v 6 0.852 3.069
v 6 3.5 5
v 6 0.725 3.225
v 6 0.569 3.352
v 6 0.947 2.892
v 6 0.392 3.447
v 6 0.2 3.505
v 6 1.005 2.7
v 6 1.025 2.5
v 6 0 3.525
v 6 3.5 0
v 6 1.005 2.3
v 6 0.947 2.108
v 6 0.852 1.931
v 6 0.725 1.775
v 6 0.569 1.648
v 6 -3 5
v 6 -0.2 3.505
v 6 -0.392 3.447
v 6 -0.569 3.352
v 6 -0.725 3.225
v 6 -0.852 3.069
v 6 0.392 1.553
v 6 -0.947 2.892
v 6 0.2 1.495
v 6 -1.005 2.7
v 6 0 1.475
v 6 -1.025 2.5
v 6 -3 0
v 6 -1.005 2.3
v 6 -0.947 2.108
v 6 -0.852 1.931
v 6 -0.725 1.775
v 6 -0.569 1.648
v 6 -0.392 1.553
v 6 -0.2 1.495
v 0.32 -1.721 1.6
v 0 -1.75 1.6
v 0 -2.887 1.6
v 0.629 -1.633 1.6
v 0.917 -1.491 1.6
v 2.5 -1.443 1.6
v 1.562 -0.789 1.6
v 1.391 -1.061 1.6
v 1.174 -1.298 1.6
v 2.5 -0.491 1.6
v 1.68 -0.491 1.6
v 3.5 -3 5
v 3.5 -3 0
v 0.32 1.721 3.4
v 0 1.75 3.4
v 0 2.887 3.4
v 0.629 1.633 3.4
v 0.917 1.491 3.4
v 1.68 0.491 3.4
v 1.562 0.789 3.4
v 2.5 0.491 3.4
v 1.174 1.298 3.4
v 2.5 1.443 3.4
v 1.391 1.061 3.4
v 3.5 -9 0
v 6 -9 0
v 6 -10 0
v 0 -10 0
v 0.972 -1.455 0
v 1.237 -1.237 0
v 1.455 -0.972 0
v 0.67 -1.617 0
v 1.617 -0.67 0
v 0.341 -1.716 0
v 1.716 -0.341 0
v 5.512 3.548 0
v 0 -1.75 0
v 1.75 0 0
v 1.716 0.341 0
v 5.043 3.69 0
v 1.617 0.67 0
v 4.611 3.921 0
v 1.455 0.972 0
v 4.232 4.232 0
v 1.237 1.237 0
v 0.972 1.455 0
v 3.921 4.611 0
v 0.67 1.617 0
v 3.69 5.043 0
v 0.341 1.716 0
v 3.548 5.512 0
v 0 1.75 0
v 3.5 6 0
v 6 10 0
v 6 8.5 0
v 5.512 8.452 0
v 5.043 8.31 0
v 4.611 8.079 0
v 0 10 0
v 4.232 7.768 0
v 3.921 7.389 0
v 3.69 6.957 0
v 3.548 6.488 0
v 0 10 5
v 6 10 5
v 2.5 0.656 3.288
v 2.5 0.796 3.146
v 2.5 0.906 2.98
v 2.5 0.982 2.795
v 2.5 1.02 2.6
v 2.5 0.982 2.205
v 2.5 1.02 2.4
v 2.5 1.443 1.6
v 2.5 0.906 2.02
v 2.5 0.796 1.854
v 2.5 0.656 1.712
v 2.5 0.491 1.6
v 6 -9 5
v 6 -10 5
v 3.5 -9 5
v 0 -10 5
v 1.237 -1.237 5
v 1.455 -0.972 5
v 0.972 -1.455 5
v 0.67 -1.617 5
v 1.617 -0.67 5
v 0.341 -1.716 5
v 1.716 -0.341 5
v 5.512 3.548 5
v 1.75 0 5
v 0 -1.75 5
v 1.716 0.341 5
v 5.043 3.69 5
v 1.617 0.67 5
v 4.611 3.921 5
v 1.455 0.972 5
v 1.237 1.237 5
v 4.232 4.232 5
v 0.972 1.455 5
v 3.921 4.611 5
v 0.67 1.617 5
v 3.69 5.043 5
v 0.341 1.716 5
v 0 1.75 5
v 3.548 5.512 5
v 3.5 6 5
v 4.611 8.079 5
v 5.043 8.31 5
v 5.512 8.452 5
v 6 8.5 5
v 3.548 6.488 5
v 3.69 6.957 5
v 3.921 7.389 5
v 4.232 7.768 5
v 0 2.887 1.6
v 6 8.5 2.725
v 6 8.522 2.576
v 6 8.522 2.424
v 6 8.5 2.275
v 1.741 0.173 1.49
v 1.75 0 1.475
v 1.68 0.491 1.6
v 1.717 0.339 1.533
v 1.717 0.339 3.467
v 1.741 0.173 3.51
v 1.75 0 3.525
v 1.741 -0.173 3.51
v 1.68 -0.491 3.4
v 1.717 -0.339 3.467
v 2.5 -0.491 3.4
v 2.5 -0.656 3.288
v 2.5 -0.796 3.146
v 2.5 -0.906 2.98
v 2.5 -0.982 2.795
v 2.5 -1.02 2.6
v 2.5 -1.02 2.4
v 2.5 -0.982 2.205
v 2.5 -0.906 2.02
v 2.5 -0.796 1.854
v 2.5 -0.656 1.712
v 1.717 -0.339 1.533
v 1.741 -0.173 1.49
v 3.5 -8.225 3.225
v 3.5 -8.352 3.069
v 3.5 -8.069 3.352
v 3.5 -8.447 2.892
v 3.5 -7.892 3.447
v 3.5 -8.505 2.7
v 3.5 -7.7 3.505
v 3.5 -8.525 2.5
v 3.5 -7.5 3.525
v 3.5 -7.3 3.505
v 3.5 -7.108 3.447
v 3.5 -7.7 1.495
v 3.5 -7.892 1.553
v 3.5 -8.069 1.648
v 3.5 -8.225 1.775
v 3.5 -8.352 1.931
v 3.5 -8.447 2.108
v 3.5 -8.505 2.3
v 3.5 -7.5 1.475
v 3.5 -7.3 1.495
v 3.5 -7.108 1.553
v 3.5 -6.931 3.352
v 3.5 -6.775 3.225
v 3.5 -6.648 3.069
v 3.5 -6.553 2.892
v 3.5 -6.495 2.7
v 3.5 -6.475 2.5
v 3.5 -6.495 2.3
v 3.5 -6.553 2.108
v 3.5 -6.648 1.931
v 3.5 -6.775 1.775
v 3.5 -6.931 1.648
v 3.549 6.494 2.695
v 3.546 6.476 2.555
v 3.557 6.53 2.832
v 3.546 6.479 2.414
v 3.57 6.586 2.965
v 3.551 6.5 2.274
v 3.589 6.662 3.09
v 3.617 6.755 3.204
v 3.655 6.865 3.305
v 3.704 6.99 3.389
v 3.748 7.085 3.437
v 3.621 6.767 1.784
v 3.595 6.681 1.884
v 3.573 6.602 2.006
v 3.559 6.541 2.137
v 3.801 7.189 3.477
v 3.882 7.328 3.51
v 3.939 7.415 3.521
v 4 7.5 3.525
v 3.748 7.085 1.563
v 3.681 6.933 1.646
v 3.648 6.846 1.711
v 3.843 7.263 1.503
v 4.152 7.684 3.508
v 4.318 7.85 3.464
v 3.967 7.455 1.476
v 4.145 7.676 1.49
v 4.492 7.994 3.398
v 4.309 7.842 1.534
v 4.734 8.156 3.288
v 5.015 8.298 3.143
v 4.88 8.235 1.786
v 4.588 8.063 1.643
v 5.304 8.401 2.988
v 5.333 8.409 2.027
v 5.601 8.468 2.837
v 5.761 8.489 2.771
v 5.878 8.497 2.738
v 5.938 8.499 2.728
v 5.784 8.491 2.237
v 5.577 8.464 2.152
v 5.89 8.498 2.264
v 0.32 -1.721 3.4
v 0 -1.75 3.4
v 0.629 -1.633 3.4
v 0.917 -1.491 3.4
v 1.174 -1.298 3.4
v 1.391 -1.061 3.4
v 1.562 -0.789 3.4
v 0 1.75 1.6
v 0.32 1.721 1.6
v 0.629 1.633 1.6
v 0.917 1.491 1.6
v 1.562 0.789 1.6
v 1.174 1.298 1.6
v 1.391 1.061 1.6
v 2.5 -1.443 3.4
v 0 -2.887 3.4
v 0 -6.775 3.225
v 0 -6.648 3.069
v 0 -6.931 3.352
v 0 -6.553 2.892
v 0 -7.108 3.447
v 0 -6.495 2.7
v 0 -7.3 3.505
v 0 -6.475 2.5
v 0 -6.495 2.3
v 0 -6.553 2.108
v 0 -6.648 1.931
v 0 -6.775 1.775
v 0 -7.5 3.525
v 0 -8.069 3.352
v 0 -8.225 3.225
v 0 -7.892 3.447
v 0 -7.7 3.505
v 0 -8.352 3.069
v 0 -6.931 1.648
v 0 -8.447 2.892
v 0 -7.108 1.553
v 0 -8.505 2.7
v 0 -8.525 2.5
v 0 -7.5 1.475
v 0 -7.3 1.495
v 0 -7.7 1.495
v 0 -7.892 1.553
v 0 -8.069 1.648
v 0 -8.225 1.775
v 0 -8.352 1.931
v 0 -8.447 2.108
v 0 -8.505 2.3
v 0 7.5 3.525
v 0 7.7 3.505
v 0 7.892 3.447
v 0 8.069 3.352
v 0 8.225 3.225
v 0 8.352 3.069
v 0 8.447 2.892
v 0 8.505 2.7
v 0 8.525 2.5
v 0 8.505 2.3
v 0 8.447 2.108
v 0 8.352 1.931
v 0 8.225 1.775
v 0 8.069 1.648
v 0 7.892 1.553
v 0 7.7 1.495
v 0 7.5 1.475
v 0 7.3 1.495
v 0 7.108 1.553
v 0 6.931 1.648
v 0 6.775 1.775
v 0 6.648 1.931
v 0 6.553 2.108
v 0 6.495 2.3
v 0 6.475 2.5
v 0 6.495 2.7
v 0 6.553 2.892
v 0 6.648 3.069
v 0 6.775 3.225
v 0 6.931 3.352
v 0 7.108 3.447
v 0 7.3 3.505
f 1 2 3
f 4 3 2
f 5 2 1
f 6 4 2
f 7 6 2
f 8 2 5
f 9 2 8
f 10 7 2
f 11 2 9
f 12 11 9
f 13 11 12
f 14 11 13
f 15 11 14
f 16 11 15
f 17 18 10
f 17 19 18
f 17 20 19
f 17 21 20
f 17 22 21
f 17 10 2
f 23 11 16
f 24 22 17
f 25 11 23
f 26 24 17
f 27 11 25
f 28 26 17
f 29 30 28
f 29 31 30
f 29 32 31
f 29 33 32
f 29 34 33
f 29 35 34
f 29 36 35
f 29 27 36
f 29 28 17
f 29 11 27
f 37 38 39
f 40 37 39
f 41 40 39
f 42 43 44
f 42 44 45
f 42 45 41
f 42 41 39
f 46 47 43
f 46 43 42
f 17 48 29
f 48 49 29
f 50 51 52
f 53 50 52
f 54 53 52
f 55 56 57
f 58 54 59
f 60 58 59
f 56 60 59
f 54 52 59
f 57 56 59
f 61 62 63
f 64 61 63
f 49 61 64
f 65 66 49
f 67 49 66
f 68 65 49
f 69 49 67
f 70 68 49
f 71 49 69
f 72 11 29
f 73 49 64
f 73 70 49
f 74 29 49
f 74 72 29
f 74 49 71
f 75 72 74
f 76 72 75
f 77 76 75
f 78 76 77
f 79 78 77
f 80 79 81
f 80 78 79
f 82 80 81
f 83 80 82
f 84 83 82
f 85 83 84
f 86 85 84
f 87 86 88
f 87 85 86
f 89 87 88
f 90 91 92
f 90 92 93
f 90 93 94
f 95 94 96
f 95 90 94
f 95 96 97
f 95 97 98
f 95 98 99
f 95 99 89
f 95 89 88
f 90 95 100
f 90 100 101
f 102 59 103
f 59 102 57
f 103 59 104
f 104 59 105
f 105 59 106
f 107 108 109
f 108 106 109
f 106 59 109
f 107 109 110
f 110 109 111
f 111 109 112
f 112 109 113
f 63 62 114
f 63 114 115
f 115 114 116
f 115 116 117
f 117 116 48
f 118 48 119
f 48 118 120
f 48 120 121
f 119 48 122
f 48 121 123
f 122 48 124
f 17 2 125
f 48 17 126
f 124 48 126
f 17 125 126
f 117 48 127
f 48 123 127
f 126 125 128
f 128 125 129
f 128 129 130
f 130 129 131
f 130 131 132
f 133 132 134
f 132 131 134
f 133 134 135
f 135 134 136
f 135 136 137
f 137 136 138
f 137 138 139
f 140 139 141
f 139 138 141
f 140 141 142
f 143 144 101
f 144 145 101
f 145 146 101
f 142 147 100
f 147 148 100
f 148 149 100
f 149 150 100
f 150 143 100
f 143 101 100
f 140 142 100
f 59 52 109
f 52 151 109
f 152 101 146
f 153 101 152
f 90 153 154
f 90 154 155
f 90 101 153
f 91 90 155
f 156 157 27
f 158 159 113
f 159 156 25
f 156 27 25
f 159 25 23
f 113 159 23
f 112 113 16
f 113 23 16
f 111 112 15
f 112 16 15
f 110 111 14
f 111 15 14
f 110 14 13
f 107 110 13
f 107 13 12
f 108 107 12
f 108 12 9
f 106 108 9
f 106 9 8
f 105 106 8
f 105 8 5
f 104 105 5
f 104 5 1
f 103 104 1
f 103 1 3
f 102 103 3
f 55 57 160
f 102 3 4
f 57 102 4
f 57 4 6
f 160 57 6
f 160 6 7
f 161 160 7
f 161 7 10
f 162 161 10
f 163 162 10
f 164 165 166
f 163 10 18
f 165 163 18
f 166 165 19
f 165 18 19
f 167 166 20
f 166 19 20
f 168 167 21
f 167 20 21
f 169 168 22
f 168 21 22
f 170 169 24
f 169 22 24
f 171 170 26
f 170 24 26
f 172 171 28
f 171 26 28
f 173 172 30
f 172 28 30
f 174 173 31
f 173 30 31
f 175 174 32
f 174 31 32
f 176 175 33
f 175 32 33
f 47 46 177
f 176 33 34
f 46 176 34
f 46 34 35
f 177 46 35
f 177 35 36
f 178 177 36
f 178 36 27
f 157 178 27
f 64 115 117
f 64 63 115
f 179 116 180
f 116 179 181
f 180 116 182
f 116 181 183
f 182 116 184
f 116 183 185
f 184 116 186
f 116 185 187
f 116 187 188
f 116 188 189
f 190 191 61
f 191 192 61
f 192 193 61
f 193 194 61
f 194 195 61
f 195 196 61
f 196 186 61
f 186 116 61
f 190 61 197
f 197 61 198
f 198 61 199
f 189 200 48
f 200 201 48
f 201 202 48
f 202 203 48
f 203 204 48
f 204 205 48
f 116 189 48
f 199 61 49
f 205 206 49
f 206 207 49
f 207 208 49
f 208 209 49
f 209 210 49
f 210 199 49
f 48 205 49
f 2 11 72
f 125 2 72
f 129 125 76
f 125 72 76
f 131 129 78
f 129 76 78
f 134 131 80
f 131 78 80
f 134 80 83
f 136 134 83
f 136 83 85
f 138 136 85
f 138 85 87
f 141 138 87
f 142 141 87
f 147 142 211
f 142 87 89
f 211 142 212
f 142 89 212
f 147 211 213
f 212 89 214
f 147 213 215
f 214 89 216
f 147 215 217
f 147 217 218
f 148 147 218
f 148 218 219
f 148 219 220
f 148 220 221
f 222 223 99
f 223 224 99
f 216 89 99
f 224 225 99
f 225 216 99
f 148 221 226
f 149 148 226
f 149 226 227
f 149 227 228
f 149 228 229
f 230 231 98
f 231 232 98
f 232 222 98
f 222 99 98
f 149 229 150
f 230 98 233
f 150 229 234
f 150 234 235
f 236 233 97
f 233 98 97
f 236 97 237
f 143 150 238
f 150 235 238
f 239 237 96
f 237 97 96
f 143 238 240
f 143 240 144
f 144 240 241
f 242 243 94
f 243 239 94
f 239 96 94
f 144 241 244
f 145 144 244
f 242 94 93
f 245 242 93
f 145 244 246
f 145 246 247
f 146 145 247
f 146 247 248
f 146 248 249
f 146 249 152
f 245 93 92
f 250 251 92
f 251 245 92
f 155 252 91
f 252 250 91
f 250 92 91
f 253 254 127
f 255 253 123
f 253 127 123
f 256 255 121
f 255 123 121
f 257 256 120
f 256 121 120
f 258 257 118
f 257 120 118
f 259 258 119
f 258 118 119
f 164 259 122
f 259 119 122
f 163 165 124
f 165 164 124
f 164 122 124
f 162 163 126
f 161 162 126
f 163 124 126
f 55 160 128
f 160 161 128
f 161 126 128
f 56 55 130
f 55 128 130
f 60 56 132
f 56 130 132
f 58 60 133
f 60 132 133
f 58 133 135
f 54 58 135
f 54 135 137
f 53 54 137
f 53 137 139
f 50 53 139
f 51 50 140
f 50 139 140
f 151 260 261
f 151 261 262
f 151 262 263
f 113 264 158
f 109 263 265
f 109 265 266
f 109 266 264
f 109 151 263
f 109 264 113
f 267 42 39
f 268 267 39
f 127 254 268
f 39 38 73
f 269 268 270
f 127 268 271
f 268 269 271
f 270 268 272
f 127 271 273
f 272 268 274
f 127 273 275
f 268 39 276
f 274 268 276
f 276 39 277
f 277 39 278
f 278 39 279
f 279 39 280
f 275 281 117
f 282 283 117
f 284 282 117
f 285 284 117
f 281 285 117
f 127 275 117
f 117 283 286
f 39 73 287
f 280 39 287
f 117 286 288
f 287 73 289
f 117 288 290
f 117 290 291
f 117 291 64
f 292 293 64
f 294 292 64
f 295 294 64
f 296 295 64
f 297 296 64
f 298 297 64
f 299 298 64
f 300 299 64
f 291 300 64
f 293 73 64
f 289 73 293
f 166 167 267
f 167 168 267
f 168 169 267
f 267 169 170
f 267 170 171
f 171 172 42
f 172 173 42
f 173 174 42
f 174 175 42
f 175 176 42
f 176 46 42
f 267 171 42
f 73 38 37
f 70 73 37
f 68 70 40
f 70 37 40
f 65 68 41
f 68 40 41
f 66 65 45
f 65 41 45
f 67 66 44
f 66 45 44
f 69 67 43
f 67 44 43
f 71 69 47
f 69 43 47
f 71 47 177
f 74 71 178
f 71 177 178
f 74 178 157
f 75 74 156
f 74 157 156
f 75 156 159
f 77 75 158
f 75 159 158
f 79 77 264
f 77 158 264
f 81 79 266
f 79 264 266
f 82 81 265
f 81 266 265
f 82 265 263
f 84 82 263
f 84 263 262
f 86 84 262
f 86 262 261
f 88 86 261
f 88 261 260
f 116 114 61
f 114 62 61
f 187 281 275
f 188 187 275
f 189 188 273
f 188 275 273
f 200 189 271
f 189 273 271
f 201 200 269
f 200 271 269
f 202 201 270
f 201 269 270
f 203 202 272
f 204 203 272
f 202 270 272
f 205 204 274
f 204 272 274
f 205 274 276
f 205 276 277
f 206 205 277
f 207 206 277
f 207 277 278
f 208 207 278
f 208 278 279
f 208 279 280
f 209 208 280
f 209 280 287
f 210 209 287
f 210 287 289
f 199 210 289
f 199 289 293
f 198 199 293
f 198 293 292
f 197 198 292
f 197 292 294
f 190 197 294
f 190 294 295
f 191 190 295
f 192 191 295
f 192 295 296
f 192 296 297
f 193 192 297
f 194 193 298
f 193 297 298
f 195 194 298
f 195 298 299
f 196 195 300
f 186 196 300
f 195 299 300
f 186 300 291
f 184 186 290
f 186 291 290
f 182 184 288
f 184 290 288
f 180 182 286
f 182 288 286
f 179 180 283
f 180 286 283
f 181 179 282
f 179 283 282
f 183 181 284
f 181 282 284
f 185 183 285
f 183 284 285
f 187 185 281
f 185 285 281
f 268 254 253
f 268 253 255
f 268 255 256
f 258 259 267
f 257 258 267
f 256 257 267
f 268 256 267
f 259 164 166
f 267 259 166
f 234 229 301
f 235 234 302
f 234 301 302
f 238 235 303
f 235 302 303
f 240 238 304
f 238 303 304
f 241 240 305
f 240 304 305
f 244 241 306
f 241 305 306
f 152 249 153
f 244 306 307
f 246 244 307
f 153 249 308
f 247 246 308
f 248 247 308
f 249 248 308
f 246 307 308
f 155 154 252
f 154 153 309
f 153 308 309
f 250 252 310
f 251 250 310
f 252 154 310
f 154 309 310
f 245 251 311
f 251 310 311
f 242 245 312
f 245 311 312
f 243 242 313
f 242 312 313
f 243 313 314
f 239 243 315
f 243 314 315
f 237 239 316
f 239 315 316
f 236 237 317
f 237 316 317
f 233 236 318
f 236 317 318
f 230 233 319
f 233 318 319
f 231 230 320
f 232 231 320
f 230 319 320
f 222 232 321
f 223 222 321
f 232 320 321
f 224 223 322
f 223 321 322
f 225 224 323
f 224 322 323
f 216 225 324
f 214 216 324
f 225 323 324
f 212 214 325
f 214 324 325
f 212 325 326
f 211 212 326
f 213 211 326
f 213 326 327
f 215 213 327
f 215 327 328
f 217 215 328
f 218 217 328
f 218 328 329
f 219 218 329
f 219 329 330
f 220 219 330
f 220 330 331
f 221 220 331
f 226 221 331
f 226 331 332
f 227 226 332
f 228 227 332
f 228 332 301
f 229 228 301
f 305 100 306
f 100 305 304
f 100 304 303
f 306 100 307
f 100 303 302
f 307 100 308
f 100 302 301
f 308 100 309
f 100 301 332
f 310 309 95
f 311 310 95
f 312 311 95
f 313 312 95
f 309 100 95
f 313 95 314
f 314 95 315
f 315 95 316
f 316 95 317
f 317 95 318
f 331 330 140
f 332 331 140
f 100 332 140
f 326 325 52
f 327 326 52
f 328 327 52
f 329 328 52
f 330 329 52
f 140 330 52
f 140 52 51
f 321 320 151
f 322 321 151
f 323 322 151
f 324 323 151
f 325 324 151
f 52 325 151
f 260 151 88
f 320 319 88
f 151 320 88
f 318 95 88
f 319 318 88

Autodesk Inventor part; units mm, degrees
ref_plane "YZ Plane" through (0, 0, 0) normal (1, 0, 0) x (0, 1, 0)
ref_plane "XZ Plane" through (0, 0, 0) normal (0, 1, 0) x (-1, 0, 0)
ref_plane "XY Plane" through (0, 0, 0) normal (0, 0, 1) x (1, 0, 0)
sketch "Sketch1" plane through (0, 0, 0) normal (0, 0, 1) x (1, 0, 0)
  line L0 (10, -10) -> (-10, -10)
  line L1 (-10, -10) -> (-10, 10)
  line L2 (-10, 10) -> (10, 10)
  line L3 (10, 10) -> (10, -10)
  line L4 (10, -10) -> (-10, 10) construction
  line L5 (-10, -10) -> (10, 10) construction
  line L6 (10, -10) -> (6, -10)
  line L7 (6, -10) -> (6, 10)
  line L8 (6, 10) -> (10, 10)
  line L9 (10, 10) -> (10, -10)
  line L10 (6, 2) -> (4, 2)
  line L11 (4, 2) -> (4, -2)
  line L12 (4, -2) -> (6, -2)
  line L13 (6, -2) -> (6, 2)
  line L14 (0, 10) -> (0, -10)
  point P0 (0, 0)
  dimension "d0" = 20
  dimension "d1" = 20
  dimension "d2" = 4
  dimension "d6" = 2
  dimension "d7" = 2
  dimension "d8" = 4
  dimension "d9" = 2
  dimension "d44" = 6
extrude "Extrusion1" add sketch "Sketch1" along normal blind 5 contours L0 L14 L2 L7 L10 L11 L12
ref_plane "Work Plane1" through (0, 0, 2.5) normal (0, 0, 1) x (1, 0, 0)
sketch "Sketch2" plane through (0, 0, 2.5) normal (0, 0, 1) x (1, 0, 0)
  line L0 (0, 10) -> (0, -10) projected
  line L1 (0, 2.8868) -> (2.5, 1.4434)
  line L2 (2.5, 1.4434) -> (2.5, -1.4434)
  line L3 (2.5, -1.4434) -> (0, -2.8868)
  line L4 (0, -2.8868) -> (-2.5, -1.4434)
  line L5 (-2.5, -1.4434) -> (-2.5, 1.4434)
  line L6 (-2.5, 1.4434) -> (0, 2.8868)
  point P0 (0, 0)
  point P1 (0, 0)
  dimension "d12" = 5
extrude "Extrusion2" cut sketch "Sketch2" along normal mid plane 1.8
sketch "Sketch3" plane through (0, 0, 5) normal (0, 0, 1) x (1, 0, 0)
  circle A0 centre (0, 0) radius 1.75
  dimension "d15" = 3.5
extrude "Extrusion3" cut sketch "Sketch3" against normal blind 8
sketch "Sketch4" plane through (0, 10, 0) normal (-1, 0, 0) x (0, 0, 1)
  circle A0 centre (2.5, -2.5) radius 1.025
  circle A1 centre (2.5, -17.5) radius 1.025
  line L0 (0, 0) -> (5, 0) projected
  line L1 (0, 0) -> (0, -8.25) projected
  line L2 (0, -11.75) -> (0, -20) projected
  line L3 (0, -20) -> (5, -20) projected
  point P0 (0, -10)
  dimension "d18" = 2.05
  dimension "d19" = 2.05
  dimension "d20" = 2.5
  dimension "d21" = 2.5
  dimension "d22" = 2.5
  dimension "d23" = 2.5
extrude "Extrusion4" cut sketch "Sketch4" against normal blind 25
sketch "Sketch5" plane through (0, 0, 0) normal (0, 0, -1) x (-1, 0, 0)
  line L0 (-4, -2) -> (-4, 2) projected
  line L1 (-6, -10) -> (-6, -2) projected
  line L2 (-4, 2) -> (-6, 2)
  line L3 (-6, 2) -> (-6, -2)
  line L4 (-6, -2) -> (-4, -2)
  line L5 (-4, -2) -> (-4, 2)
  point P0 (0, 0)
extrude "Extrusion5" add sketch "Sketch5" against normal blind 5
sketch "Sketch6" plane through (0, 0, 0) normal (0, 0, -1) x (-1, 0, 0)
  line L0 (-6, -10) -> (-6, 10) projected
  circle A0 centre (-6, 6) radius 2.5
  line L1 (-6, -9) -> (-3.5, -9)
  line L2 (-3.5, -9) -> (-3.5, -3)
  line L3 (-3.5, -3) -> (-6, -3)
  line L4 (-6, -3) -> (-6, -9)
  line L5 (0, -10) -> (-6, -10) projected
  line L6 (-6, 10) -> (0, 10) projected
  point P0 (0, 0)
  point P1 (-6, 8.5)
  point P2 (-6, 3.5)
  dimension "d32" = 2.5
  dimension "d33" = 1
  dimension "d34" = 6
  dimension "d35" = 5
  dimension "d36" = 4
extrude "Extrusion6" cut sketch "Sketch6" against normal blind 5 contours L0 A0 | L0 L3 L2 L1 picked at (-5.3485, 6.5196)
sketch "Sketch7" plane through (6, -3, 0) normal (1, 0, 0) x (0, 0, -1)
  circle A0 centre (-2.5, 3) radius 1.025
  line L0 (-5, 0) -> (-5, 6.5) projected
  line L1 (0, -7) -> (-5, -7) projected
  point P0 (0, 3)
  dimension "d39" = 2.5
  dimension "d40" = 10
  dimension "d41" = 2.05
extrude "Extrusion7" cut sketch "Sketch7" against normal blind 12
equation "\"d18\" = d19"
properties part number "POMSliderMotor"
